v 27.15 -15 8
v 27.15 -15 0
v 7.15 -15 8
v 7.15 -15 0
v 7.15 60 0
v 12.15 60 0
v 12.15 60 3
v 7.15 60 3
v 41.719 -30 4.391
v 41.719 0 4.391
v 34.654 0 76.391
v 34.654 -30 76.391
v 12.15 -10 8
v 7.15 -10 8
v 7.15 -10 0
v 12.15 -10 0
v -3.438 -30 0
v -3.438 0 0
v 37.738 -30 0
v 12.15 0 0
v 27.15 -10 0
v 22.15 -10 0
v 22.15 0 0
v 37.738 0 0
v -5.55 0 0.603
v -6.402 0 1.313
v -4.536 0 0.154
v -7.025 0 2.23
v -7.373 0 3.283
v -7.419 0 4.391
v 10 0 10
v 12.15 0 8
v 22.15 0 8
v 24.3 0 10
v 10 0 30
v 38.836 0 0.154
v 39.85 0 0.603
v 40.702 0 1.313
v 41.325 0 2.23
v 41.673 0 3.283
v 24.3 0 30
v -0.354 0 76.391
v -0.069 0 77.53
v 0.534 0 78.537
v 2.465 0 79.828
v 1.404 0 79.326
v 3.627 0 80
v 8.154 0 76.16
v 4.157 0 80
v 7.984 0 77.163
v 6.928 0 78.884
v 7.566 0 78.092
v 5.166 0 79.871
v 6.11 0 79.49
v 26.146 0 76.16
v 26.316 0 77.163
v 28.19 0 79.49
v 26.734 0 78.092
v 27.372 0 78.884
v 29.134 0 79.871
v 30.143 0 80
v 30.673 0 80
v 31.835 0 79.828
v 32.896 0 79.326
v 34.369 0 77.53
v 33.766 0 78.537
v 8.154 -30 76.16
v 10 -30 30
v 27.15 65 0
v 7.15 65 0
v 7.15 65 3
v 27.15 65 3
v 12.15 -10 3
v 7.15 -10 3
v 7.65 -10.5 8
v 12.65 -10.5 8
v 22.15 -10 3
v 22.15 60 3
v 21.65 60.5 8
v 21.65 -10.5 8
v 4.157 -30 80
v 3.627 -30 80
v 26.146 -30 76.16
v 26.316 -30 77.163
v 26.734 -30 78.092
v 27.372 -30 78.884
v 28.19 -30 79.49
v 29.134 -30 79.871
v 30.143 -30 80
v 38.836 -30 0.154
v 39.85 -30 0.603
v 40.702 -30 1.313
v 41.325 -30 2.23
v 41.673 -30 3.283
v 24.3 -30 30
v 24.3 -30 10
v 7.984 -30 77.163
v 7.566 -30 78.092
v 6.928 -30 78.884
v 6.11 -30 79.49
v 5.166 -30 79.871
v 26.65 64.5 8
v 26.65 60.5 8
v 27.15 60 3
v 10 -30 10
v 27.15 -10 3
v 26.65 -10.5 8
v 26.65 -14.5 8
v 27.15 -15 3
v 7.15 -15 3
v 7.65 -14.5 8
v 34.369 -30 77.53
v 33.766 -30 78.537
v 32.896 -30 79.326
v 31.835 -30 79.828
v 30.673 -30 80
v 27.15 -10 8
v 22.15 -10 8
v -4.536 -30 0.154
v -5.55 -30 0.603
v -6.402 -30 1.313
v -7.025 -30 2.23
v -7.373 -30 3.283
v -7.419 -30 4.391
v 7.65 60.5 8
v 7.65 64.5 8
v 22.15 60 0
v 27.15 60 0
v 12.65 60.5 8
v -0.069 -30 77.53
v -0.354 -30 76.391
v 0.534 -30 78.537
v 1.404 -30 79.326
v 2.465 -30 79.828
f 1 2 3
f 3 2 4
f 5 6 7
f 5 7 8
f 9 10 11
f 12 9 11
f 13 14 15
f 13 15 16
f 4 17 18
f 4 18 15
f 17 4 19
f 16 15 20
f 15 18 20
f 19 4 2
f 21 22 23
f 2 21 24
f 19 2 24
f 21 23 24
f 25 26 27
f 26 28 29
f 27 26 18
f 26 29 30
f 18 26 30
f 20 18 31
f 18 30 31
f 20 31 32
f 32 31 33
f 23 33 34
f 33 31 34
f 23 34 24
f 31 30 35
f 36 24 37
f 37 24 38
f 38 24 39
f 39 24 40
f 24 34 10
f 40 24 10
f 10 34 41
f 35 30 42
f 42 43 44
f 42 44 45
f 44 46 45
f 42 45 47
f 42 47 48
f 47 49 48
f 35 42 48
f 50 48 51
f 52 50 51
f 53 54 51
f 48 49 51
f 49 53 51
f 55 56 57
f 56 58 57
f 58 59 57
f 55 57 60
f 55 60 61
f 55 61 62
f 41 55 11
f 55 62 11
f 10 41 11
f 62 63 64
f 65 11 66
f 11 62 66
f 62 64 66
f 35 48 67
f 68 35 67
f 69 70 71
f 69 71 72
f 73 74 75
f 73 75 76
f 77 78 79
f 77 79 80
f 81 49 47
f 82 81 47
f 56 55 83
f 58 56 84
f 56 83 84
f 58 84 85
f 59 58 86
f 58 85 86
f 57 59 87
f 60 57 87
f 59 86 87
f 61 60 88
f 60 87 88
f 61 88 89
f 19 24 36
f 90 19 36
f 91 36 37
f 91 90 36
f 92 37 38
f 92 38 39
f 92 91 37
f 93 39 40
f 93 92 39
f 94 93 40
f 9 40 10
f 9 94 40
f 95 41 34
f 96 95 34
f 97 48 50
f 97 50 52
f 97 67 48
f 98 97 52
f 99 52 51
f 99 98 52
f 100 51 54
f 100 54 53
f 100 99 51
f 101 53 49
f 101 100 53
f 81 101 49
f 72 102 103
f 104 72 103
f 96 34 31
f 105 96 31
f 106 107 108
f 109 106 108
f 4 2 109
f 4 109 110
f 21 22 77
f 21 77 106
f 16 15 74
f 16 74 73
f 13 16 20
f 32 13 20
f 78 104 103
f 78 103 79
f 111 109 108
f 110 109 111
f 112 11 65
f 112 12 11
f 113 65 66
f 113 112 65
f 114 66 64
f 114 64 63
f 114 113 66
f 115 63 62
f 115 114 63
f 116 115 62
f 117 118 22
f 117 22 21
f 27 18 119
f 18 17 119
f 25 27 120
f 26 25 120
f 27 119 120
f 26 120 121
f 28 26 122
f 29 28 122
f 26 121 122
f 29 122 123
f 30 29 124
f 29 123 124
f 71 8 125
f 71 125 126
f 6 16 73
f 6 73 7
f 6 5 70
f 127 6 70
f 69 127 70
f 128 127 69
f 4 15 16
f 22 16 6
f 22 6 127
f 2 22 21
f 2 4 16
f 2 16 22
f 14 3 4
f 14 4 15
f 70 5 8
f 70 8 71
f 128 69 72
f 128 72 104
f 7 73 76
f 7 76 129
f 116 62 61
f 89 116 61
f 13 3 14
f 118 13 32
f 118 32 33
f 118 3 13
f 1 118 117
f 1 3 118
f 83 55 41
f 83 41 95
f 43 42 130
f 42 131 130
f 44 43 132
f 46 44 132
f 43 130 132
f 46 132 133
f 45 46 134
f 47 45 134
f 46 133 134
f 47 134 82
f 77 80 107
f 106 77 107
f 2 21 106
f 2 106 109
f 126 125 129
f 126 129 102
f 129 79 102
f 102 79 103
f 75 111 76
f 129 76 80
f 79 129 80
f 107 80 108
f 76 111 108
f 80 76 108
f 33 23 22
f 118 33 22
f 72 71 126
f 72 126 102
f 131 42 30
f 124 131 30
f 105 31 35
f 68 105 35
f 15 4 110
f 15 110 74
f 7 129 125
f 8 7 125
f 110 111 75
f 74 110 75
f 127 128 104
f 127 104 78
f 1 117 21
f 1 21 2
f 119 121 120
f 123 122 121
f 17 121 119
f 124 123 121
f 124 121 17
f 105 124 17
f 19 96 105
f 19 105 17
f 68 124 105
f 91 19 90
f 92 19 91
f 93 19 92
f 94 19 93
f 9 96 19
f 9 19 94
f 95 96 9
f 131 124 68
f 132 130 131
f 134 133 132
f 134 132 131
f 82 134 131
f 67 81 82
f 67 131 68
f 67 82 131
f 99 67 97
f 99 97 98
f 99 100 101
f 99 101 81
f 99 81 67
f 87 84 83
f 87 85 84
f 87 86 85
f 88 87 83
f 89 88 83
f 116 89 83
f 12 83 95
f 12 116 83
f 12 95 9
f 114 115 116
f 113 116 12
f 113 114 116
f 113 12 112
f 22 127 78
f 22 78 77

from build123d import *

# Parameters (mm, degrees)
F1_DEPTH = 30
F3_DEPTH = 8
F5_R     = 4
F6_SIZE2 = 50
F6_SIZE  = 2
F7_SIZE2 = 2
F7_SIZE  = 50
F8_R     = 4
F9_SIZE2 = 5
F9_SIZE  = 0.5


with BuildPart() as f1:
    # F0 (on Front) → F1 (new body)
    with BuildSketch(Plane.XZ):
        Polygon((-7.85, 0), (0, 0), (34.3, 0), (42.15, 0), (34.3, 80), (24.3, 80), (24.3, 10), (10, 10), (10, 80), (0, 80), align=None)
    extrude(amount=F1_DEPTH)


with BuildPart() as f3:
    # F2 (on face) → F3 (new body)
    with BuildSketch(Plane(origin=(0, 0, 0), x_dir=(1, 0, 0), z_dir=(0, 0, -1))):
        Polygon((12.15, 10), (12.15, 0), (12.15, -50), (12.15, -60), (7.15, -60), (7.15, -65), (27.15, -65), (27.15, -60), (22.15, -60), (22.15, -50), (22.15, 0), (22.15, 10), (27.15, 10), (27.15, 15), (7.15, 15), (7.15, 10), align=None)
    extrude(amount=-F3_DEPTH)


with BuildPart() as f1_1:
    add(f1.part)

    # F4: cut F3
    add(f3.part, mode=Mode.SUBTRACT)

    # F5
    f5_edges = [f1_1.edges().sort_by_distance(p)[0] for p in [
        (-7.85, -15, 0),
        (42.15, -15, 0),
        (34.3, -15, 80),
        (0, -15, 80),
    ]]
    fillet(f5_edges, radius=F5_R)

    # F6
    f6_edges = [f1_1.edges().sort_by_distance(p)[0] for p in [
        (10, -15, 80),
    ]]
    f6_side = f1_1.faces().sort_by_distance((6.813355, -15, 80))[0]
    chamfer(f6_edges, length=F6_SIZE, length2=F6_SIZE2, reference=f6_side)

    # F7
    f7_edges = [f1_1.edges().sort_by_distance(p)[0] for p in [
        (24.3, -15, 80),
    ]]
    f7_side = f1_1.faces().sort_by_distance((24.3, -15, 45))[0]
    chamfer(f7_edges, length=F7_SIZE, length2=F7_SIZE2, reference=f7_side)

    # F8
    f8_edges = [f1_1.edges().sort_by_distance(p)[0] for p in [
        (8, -15, 80),
        (26.3, -15, 80),
    ]]
    fillet(f8_edges, radius=F8_R)


with BuildPart() as f3_1:
    add(f3.part)

    # F9
    f9_edges = [f3_1.edges().sort_by_distance(p)[0] for p in [
        (22.15, 25, 8),
        (24.65, 60, 8),
        (27.15, 62.5, 8),
        (24.65, -10, 8),
        (27.15, -12.5, 8),
        (17.15, 65, 8),
        (7.15, 62.5, 8),
        (12.15, 25, 8),
        (9.65, -10, 8),
        (7.15, -12.5, 8),
        (9.65, 60, 8),
        (17.15, -15, 8),
    ]]
    f9_side = f3_1.faces().sort_by_distance((17.15, 25, 8))[0]
    chamfer(f9_edges, length=F9_SIZE, length2=F9_SIZE2, reference=f9_side)


solid = Compound([f1_1.part, f3_1.part])
